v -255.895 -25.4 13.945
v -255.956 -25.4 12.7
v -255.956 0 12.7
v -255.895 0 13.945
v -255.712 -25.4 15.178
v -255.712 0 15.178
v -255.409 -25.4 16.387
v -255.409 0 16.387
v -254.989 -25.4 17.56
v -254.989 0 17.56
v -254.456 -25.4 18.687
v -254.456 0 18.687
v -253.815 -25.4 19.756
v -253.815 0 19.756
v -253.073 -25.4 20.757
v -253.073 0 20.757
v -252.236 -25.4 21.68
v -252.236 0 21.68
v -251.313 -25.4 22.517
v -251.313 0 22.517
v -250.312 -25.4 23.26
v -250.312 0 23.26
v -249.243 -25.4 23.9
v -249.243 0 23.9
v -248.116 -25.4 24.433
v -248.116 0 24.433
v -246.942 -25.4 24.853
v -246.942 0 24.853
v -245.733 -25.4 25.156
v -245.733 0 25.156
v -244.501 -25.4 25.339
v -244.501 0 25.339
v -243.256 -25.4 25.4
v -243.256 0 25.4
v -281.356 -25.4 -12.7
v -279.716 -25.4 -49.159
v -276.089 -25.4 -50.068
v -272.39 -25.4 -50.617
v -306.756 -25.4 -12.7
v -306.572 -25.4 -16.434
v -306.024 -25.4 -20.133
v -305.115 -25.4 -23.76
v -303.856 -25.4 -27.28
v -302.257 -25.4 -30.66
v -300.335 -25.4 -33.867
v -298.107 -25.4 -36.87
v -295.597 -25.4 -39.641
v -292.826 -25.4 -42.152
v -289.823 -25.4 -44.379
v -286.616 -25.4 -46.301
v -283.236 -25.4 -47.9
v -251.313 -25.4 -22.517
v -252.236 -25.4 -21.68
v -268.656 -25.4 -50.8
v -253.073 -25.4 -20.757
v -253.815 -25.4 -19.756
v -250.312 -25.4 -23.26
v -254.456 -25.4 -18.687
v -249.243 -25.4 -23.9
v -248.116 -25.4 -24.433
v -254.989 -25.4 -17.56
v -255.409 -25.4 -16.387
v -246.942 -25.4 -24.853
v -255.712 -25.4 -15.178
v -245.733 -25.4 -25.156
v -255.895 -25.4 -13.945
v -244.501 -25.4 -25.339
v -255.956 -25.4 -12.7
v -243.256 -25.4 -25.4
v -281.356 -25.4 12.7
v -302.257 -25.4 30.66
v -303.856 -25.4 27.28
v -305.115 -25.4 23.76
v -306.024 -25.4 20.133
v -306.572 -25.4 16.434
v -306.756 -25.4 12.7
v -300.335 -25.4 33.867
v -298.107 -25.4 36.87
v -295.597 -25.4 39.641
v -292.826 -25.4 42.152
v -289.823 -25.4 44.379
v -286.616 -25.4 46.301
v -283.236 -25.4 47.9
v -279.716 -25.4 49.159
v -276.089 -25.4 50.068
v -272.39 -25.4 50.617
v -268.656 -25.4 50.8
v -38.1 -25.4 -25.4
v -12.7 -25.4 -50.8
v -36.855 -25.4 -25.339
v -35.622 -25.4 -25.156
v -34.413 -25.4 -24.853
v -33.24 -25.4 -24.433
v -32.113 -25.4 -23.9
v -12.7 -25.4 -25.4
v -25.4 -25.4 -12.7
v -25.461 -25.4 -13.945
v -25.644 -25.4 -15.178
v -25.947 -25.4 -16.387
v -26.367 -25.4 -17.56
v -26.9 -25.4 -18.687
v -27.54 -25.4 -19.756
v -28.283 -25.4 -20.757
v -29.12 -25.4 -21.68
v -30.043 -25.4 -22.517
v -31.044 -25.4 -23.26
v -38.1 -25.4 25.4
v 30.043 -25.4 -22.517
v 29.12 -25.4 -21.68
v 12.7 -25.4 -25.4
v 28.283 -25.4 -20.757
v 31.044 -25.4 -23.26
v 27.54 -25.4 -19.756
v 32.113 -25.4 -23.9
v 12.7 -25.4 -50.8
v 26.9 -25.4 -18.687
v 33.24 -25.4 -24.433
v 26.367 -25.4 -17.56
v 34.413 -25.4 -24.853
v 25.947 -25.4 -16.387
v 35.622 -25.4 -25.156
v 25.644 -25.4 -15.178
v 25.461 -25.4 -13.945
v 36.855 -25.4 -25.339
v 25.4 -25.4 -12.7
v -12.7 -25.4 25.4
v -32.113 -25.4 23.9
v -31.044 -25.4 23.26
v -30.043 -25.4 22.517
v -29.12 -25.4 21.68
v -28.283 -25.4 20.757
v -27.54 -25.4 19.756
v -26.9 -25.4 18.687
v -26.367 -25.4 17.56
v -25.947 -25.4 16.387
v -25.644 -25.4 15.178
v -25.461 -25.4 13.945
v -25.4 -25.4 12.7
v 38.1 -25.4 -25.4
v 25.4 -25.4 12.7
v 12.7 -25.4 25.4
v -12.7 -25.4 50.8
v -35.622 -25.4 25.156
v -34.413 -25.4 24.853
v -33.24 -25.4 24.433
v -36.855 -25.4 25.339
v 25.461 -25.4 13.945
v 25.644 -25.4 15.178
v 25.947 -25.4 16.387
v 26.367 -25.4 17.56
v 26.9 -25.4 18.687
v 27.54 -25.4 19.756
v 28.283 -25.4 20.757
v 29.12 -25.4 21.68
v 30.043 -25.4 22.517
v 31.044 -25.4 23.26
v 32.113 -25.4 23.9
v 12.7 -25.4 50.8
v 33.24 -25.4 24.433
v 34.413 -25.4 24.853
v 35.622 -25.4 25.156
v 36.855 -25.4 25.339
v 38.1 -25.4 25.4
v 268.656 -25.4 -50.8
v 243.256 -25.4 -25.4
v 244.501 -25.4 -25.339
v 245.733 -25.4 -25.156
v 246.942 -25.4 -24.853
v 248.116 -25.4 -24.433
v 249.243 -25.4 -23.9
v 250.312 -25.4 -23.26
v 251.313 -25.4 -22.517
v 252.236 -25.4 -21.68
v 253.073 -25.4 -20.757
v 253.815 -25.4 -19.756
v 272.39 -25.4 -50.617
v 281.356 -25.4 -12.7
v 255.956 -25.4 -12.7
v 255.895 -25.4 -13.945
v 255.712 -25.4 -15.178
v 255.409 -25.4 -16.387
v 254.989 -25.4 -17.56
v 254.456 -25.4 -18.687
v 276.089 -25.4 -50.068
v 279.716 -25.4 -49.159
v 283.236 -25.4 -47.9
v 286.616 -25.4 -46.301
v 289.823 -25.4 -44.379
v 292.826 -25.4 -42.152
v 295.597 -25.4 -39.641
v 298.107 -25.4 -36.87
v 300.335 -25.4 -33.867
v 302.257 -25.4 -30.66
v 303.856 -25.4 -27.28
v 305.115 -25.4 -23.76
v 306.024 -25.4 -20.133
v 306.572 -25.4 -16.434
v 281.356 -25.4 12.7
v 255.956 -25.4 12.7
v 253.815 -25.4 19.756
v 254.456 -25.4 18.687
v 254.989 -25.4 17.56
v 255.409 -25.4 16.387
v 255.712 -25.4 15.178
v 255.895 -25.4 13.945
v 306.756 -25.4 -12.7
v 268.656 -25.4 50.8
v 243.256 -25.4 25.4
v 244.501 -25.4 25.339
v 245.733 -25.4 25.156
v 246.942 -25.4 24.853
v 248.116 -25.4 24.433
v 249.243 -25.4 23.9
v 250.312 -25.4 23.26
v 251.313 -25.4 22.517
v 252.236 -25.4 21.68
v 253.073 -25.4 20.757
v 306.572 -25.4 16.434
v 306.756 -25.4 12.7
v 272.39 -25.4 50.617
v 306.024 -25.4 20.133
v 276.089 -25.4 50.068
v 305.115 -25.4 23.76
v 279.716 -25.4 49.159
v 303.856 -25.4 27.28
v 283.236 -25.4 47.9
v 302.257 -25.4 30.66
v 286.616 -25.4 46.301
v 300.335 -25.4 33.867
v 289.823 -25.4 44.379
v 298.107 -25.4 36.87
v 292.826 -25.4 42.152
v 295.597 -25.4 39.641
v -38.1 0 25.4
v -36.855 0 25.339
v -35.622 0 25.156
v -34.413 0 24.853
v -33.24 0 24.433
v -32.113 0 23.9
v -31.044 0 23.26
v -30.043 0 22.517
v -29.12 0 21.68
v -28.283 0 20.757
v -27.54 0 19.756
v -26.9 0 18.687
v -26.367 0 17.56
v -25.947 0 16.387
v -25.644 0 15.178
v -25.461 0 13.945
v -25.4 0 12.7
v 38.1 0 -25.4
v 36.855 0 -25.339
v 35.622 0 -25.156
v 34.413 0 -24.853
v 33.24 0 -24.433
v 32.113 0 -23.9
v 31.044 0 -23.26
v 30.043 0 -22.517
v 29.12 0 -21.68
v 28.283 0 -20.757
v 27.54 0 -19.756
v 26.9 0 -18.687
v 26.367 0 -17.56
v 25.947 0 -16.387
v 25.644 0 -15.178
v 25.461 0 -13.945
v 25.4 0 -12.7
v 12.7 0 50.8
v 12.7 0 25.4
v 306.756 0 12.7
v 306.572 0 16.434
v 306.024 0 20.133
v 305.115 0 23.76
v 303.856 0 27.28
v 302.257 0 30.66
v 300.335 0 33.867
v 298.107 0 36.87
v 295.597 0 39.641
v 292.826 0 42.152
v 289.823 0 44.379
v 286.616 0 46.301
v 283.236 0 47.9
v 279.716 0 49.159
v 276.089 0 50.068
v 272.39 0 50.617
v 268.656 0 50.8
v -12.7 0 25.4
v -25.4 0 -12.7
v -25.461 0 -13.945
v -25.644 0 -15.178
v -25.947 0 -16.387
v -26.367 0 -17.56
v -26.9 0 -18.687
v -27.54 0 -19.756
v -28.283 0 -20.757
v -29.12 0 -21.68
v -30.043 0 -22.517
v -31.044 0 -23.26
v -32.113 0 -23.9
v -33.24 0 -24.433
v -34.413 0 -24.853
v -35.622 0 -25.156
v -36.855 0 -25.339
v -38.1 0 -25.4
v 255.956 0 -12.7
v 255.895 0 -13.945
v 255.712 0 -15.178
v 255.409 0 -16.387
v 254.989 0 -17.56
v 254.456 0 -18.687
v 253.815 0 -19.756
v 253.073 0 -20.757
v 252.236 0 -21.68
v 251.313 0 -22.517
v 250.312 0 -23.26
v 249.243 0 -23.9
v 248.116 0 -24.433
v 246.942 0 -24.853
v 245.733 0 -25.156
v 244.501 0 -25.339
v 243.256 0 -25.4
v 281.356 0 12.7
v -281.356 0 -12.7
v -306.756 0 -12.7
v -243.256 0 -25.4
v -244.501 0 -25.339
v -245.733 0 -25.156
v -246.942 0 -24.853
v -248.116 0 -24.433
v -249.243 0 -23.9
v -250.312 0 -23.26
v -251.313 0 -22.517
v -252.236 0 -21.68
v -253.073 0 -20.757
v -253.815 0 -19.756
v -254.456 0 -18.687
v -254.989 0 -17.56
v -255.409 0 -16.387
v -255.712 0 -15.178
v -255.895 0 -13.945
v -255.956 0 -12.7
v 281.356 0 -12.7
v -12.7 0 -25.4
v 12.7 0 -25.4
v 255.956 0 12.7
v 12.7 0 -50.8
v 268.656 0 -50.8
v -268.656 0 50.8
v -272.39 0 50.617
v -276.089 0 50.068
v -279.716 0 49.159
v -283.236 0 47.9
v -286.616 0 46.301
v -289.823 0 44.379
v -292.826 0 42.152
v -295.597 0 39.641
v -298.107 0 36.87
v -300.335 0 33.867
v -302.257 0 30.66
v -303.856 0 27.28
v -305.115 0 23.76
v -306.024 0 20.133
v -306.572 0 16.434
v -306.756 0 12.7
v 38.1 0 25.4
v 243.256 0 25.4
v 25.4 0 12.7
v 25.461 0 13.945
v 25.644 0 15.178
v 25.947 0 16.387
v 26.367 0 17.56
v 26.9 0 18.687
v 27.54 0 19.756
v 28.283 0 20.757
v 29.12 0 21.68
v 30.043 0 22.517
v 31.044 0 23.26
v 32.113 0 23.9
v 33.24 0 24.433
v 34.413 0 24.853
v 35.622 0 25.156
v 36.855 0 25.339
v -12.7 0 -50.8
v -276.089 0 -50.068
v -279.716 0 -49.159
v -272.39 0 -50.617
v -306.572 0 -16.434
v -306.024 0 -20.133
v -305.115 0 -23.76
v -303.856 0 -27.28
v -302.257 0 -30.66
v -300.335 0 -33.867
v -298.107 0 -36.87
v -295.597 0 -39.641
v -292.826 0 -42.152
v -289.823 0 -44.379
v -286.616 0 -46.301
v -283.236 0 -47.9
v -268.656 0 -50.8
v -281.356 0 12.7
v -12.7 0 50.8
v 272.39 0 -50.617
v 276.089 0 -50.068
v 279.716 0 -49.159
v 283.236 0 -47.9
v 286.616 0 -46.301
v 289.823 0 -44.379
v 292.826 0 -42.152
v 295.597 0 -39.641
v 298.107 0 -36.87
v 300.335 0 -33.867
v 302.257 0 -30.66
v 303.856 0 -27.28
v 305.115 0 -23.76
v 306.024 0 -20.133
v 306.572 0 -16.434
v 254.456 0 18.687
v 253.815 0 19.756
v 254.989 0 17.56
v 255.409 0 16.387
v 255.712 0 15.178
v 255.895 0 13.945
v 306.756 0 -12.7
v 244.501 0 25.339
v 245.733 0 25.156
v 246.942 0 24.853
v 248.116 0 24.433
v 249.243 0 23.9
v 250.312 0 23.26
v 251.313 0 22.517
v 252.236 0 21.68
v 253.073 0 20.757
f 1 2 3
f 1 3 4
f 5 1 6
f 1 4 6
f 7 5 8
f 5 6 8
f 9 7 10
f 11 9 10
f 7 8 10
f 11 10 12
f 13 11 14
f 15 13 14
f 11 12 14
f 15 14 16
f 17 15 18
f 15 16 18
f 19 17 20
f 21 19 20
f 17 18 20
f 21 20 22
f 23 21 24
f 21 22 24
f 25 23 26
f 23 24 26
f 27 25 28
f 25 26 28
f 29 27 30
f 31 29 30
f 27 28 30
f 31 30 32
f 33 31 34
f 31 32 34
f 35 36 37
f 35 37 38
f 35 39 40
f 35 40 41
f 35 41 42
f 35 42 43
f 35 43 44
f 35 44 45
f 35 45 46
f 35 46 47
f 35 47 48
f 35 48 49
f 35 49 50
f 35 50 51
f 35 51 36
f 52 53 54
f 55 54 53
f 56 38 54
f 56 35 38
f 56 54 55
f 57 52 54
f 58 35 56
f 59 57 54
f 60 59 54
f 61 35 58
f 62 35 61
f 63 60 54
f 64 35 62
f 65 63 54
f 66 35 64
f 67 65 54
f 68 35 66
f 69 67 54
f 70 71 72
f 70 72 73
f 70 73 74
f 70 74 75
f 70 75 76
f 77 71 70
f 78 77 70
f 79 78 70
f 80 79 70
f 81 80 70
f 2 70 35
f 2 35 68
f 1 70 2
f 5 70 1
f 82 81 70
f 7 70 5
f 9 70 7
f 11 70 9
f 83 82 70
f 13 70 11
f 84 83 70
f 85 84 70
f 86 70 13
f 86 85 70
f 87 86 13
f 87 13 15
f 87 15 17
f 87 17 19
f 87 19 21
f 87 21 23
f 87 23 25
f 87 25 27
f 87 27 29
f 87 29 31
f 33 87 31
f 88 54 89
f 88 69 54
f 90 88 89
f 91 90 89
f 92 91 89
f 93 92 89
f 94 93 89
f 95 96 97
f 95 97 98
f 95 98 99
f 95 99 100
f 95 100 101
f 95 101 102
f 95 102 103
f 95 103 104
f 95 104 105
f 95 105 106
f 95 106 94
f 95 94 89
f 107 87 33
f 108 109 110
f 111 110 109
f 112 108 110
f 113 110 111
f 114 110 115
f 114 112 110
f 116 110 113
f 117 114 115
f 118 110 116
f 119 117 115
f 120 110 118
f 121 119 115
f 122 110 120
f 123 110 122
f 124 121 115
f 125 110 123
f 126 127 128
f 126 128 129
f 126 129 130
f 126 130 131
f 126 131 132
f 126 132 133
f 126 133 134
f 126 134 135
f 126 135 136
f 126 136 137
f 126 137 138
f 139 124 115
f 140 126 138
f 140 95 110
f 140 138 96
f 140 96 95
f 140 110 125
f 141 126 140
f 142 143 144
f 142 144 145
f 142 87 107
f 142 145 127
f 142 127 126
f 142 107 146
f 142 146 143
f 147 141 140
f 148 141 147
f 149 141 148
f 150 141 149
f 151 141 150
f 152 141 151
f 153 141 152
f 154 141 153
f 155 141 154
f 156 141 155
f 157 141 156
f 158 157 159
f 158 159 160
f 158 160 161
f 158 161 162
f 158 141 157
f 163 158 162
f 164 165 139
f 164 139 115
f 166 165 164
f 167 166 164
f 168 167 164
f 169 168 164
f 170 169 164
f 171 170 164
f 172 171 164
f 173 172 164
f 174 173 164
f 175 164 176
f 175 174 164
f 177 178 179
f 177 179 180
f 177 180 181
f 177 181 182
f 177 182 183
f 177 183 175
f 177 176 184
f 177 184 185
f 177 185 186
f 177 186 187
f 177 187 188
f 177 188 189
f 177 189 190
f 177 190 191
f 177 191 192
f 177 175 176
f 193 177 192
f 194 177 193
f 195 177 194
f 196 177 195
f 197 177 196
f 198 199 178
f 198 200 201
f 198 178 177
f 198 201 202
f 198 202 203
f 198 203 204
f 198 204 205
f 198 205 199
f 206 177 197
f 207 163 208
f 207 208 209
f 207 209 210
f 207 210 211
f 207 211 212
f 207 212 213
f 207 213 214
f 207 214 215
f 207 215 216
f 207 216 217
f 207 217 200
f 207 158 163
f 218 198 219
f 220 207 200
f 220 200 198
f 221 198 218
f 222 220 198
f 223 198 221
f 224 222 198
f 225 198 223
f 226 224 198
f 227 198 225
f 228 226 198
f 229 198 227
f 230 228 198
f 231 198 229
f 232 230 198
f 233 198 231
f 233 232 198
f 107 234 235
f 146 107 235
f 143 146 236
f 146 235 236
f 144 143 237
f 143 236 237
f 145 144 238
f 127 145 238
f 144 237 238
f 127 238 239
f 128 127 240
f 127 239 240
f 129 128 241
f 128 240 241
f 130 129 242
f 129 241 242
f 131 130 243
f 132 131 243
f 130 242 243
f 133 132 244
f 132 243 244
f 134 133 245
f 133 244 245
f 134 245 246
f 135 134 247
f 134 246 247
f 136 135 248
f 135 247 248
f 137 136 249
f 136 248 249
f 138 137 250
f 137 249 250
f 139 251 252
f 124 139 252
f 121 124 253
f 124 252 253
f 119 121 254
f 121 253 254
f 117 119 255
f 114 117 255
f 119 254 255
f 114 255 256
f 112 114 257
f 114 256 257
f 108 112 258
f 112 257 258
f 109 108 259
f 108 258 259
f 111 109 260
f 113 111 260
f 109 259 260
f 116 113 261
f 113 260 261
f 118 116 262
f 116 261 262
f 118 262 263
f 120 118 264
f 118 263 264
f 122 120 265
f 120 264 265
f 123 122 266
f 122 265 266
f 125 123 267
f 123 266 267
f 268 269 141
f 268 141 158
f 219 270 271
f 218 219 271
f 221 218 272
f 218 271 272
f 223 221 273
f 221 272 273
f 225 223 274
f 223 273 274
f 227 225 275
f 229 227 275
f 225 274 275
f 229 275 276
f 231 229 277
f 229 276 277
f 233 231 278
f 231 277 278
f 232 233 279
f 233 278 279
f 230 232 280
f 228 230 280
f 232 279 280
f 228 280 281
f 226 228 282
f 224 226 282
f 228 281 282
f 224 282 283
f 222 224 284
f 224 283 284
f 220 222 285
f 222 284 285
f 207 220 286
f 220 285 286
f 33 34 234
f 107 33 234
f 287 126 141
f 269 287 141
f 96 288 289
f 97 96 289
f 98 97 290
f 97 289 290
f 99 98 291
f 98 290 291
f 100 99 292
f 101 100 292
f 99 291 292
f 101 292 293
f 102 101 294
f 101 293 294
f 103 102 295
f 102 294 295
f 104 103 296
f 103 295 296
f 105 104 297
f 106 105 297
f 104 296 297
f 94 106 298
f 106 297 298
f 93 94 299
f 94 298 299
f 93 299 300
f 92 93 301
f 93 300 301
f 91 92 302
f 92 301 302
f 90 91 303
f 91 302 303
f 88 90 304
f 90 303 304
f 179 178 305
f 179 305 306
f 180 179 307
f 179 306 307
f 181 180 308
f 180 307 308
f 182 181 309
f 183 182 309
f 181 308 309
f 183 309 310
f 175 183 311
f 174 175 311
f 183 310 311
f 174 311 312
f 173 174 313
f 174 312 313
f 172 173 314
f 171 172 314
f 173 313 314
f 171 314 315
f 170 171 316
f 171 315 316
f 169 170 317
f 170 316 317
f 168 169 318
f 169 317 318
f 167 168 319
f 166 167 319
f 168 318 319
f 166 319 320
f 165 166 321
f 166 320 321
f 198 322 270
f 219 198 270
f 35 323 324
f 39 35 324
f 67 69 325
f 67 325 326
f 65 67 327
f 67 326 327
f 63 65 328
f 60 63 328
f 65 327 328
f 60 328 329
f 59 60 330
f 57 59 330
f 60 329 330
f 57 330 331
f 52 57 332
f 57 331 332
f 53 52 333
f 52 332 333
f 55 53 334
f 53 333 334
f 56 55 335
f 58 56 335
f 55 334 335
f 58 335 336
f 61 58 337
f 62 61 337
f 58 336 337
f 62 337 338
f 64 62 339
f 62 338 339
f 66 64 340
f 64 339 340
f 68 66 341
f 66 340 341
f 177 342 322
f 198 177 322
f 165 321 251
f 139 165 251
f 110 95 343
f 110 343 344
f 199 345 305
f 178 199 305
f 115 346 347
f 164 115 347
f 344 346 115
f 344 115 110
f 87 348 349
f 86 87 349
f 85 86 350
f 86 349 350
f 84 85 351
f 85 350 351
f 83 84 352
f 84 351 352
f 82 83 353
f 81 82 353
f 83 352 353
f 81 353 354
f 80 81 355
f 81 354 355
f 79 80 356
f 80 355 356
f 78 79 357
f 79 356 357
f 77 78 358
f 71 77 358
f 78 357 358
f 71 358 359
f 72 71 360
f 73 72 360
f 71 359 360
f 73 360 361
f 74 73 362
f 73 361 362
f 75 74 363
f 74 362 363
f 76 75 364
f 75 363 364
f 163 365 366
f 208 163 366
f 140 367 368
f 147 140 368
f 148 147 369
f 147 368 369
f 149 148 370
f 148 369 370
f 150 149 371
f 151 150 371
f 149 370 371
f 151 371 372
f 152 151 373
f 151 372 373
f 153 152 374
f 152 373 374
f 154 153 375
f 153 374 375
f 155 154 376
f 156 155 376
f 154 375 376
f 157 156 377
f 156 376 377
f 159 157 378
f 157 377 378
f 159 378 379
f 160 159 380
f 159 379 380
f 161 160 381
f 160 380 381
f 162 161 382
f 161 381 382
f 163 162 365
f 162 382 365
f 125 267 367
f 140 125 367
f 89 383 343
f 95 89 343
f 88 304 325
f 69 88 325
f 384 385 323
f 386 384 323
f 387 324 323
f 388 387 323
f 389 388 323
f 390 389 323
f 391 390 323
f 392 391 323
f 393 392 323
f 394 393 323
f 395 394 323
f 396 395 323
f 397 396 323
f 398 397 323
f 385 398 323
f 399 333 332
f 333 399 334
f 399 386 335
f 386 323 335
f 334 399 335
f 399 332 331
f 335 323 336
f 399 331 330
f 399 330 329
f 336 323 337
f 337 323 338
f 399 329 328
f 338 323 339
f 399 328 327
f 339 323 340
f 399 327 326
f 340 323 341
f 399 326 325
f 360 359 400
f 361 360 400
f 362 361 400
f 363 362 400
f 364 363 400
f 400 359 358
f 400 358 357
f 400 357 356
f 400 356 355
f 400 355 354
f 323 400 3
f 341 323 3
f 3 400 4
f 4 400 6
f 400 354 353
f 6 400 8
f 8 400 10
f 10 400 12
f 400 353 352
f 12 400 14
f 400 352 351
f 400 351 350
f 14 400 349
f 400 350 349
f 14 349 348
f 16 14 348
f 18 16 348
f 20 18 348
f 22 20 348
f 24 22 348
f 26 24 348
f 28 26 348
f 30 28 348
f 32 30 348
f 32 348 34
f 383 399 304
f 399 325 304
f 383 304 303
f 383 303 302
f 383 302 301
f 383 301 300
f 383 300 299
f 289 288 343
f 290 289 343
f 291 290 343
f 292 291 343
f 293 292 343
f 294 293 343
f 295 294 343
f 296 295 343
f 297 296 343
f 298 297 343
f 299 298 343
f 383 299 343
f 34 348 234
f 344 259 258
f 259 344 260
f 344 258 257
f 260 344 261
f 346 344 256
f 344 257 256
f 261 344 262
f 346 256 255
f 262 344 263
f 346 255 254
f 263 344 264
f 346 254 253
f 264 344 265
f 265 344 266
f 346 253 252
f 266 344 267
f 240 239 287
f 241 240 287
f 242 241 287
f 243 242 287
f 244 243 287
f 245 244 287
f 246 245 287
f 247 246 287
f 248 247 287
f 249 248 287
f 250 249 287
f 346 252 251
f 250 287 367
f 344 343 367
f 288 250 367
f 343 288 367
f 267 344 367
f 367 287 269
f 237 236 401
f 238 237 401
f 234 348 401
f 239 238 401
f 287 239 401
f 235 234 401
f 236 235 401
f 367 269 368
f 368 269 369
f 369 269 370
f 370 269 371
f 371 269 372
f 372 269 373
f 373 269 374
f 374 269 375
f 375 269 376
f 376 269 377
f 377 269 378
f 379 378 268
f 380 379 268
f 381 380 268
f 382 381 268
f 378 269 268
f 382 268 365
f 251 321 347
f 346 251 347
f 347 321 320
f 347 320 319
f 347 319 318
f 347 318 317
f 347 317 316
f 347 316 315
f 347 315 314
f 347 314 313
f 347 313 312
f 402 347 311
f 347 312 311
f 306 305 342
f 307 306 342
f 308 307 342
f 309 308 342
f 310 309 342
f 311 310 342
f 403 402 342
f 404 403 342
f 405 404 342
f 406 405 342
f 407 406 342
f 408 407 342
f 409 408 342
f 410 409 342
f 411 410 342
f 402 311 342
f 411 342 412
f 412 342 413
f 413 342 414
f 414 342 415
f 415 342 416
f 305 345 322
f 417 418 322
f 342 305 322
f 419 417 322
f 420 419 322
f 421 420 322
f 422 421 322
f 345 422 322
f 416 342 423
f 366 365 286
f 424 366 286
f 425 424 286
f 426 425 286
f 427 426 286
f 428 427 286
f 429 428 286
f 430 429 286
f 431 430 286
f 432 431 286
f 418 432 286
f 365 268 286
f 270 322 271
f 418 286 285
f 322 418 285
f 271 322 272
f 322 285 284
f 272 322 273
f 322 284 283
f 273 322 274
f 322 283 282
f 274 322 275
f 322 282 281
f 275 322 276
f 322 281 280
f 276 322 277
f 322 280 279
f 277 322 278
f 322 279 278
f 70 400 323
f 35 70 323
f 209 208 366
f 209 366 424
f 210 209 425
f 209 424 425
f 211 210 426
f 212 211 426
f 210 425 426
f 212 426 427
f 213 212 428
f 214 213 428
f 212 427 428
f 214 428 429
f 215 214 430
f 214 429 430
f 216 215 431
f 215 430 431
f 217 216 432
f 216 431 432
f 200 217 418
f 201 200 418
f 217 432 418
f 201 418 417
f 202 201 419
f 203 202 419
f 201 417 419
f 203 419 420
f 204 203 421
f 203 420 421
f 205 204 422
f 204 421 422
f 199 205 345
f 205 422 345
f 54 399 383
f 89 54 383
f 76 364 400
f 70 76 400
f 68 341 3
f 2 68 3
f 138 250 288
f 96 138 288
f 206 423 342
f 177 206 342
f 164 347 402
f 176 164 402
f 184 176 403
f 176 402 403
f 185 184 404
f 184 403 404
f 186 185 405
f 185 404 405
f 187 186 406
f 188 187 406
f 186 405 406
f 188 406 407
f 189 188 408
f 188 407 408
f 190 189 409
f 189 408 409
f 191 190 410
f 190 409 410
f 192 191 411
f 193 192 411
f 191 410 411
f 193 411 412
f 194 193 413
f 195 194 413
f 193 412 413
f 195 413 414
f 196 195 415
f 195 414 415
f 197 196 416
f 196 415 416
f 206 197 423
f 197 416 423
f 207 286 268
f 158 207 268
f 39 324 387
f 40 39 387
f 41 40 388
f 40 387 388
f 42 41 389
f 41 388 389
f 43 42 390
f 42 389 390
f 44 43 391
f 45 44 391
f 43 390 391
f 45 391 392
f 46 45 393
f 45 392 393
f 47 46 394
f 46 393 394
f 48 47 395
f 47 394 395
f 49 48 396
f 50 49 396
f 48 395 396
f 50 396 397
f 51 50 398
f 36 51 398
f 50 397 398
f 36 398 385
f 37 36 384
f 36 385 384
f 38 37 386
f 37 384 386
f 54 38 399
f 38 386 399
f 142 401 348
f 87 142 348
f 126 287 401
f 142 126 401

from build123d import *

# Parameters (mm, degrees)
F1_DEPTH = 25.4
F2_W     = 25.4
F2_H     = 25.4
F3_DEPTH = 25.4


with BuildPart() as f1:
    # F0 (on Front) → F1 (new body)
    with BuildSketch(Plane.XZ):
        with BuildLine():
            Line((-306.7558, 12.7), (-281.3558, 12.7))
            Line((-281.3558, 12.7), (-281.3558, -12.7))
            Line((-281.3558, -12.7), (-306.7558, -12.7))
            ThreePointArc((-306.7558, -12.7), (-295.596568, -39.640768), (-268.6558, -50.8))
            Line((-268.6558, -50.8), (0, -50.8))
            Line((0, -50.8), (268.6558, -50.8))
            ThreePointArc((268.6558, -50.8), (295.596568, -39.640768), (306.7558, -12.7))
            Line((306.7558, -12.7), (281.3558, -12.7))
            Line((281.3558, -12.7), (281.3558, 12.7))
            Line((281.3558, 12.7), (306.7558, 12.7))
            ThreePointArc((306.7558, 12.7), (295.596568, 39.640768), (268.6558, 50.8))
            Line((268.6558, 50.8), (0, 50.8))
            Line((0, 50.8), (-268.6558, 50.8))
            ThreePointArc((-268.6558, 50.8), (-295.596568, 39.640768), (-306.7558, 12.7))
        make_face()
        with BuildLine():
            Line((-38.1, -25.4), (-243.2558, -25.4))
            ThreePointArc((-243.2558, -25.4), (-252.236056, -21.680256), (-255.9558, -12.7))
            Line((-255.9558, -12.7), (-255.9558, 12.7))
            ThreePointArc((-255.9558, 12.7), (-252.236056, 21.680256), (-243.2558, 25.4))
            Line((-243.2558, 25.4), (-38.1, 25.4))
            ThreePointArc((-38.1, 25.4), (-29.119744, 21.680256), (-25.4, 12.7))
            Line((-25.4, 12.7), (-25.4, -12.7))
            ThreePointArc((-25.4, -12.7), (-29.119744, -21.680256), (-38.1, -25.4))
        make_face(mode=Mode.SUBTRACT)
        with BuildLine():
            ThreePointArc((255.9558, -12.7), (252.236056, -21.680256), (243.2558, -25.4))
            Line((243.2558, -25.4), (38.1, -25.4))
            ThreePointArc((38.1, -25.4), (29.119744, -21.680256), (25.4, -12.7))
            Line((25.4, -12.7), (25.4, 12.7))
            ThreePointArc((25.4, 12.7), (29.119744, 21.680256), (38.1, 25.4))
            Line((38.1, 25.4), (243.2558, 25.4))
            ThreePointArc((243.2558, 25.4), (252.236056, 21.680256), (255.9558, 12.7))
            Line((255.9558, 12.7), (255.9558, -12.7))
        make_face(mode=Mode.SUBTRACT)
    extrude(amount=F1_DEPTH)

    # F2 (on face) → F3 (cut)
    with BuildSketch(Plane.XZ.offset(25.4)):
        with Locations((0, 38.1)):
            Rectangle(F2_W, F2_H)
        with Locations((0, -38.1)):
            Rectangle(F2_W, F2_H)
    extrude(amount=-F3_DEPTH, mode=Mode.SUBTRACT)


solid = f1.part
